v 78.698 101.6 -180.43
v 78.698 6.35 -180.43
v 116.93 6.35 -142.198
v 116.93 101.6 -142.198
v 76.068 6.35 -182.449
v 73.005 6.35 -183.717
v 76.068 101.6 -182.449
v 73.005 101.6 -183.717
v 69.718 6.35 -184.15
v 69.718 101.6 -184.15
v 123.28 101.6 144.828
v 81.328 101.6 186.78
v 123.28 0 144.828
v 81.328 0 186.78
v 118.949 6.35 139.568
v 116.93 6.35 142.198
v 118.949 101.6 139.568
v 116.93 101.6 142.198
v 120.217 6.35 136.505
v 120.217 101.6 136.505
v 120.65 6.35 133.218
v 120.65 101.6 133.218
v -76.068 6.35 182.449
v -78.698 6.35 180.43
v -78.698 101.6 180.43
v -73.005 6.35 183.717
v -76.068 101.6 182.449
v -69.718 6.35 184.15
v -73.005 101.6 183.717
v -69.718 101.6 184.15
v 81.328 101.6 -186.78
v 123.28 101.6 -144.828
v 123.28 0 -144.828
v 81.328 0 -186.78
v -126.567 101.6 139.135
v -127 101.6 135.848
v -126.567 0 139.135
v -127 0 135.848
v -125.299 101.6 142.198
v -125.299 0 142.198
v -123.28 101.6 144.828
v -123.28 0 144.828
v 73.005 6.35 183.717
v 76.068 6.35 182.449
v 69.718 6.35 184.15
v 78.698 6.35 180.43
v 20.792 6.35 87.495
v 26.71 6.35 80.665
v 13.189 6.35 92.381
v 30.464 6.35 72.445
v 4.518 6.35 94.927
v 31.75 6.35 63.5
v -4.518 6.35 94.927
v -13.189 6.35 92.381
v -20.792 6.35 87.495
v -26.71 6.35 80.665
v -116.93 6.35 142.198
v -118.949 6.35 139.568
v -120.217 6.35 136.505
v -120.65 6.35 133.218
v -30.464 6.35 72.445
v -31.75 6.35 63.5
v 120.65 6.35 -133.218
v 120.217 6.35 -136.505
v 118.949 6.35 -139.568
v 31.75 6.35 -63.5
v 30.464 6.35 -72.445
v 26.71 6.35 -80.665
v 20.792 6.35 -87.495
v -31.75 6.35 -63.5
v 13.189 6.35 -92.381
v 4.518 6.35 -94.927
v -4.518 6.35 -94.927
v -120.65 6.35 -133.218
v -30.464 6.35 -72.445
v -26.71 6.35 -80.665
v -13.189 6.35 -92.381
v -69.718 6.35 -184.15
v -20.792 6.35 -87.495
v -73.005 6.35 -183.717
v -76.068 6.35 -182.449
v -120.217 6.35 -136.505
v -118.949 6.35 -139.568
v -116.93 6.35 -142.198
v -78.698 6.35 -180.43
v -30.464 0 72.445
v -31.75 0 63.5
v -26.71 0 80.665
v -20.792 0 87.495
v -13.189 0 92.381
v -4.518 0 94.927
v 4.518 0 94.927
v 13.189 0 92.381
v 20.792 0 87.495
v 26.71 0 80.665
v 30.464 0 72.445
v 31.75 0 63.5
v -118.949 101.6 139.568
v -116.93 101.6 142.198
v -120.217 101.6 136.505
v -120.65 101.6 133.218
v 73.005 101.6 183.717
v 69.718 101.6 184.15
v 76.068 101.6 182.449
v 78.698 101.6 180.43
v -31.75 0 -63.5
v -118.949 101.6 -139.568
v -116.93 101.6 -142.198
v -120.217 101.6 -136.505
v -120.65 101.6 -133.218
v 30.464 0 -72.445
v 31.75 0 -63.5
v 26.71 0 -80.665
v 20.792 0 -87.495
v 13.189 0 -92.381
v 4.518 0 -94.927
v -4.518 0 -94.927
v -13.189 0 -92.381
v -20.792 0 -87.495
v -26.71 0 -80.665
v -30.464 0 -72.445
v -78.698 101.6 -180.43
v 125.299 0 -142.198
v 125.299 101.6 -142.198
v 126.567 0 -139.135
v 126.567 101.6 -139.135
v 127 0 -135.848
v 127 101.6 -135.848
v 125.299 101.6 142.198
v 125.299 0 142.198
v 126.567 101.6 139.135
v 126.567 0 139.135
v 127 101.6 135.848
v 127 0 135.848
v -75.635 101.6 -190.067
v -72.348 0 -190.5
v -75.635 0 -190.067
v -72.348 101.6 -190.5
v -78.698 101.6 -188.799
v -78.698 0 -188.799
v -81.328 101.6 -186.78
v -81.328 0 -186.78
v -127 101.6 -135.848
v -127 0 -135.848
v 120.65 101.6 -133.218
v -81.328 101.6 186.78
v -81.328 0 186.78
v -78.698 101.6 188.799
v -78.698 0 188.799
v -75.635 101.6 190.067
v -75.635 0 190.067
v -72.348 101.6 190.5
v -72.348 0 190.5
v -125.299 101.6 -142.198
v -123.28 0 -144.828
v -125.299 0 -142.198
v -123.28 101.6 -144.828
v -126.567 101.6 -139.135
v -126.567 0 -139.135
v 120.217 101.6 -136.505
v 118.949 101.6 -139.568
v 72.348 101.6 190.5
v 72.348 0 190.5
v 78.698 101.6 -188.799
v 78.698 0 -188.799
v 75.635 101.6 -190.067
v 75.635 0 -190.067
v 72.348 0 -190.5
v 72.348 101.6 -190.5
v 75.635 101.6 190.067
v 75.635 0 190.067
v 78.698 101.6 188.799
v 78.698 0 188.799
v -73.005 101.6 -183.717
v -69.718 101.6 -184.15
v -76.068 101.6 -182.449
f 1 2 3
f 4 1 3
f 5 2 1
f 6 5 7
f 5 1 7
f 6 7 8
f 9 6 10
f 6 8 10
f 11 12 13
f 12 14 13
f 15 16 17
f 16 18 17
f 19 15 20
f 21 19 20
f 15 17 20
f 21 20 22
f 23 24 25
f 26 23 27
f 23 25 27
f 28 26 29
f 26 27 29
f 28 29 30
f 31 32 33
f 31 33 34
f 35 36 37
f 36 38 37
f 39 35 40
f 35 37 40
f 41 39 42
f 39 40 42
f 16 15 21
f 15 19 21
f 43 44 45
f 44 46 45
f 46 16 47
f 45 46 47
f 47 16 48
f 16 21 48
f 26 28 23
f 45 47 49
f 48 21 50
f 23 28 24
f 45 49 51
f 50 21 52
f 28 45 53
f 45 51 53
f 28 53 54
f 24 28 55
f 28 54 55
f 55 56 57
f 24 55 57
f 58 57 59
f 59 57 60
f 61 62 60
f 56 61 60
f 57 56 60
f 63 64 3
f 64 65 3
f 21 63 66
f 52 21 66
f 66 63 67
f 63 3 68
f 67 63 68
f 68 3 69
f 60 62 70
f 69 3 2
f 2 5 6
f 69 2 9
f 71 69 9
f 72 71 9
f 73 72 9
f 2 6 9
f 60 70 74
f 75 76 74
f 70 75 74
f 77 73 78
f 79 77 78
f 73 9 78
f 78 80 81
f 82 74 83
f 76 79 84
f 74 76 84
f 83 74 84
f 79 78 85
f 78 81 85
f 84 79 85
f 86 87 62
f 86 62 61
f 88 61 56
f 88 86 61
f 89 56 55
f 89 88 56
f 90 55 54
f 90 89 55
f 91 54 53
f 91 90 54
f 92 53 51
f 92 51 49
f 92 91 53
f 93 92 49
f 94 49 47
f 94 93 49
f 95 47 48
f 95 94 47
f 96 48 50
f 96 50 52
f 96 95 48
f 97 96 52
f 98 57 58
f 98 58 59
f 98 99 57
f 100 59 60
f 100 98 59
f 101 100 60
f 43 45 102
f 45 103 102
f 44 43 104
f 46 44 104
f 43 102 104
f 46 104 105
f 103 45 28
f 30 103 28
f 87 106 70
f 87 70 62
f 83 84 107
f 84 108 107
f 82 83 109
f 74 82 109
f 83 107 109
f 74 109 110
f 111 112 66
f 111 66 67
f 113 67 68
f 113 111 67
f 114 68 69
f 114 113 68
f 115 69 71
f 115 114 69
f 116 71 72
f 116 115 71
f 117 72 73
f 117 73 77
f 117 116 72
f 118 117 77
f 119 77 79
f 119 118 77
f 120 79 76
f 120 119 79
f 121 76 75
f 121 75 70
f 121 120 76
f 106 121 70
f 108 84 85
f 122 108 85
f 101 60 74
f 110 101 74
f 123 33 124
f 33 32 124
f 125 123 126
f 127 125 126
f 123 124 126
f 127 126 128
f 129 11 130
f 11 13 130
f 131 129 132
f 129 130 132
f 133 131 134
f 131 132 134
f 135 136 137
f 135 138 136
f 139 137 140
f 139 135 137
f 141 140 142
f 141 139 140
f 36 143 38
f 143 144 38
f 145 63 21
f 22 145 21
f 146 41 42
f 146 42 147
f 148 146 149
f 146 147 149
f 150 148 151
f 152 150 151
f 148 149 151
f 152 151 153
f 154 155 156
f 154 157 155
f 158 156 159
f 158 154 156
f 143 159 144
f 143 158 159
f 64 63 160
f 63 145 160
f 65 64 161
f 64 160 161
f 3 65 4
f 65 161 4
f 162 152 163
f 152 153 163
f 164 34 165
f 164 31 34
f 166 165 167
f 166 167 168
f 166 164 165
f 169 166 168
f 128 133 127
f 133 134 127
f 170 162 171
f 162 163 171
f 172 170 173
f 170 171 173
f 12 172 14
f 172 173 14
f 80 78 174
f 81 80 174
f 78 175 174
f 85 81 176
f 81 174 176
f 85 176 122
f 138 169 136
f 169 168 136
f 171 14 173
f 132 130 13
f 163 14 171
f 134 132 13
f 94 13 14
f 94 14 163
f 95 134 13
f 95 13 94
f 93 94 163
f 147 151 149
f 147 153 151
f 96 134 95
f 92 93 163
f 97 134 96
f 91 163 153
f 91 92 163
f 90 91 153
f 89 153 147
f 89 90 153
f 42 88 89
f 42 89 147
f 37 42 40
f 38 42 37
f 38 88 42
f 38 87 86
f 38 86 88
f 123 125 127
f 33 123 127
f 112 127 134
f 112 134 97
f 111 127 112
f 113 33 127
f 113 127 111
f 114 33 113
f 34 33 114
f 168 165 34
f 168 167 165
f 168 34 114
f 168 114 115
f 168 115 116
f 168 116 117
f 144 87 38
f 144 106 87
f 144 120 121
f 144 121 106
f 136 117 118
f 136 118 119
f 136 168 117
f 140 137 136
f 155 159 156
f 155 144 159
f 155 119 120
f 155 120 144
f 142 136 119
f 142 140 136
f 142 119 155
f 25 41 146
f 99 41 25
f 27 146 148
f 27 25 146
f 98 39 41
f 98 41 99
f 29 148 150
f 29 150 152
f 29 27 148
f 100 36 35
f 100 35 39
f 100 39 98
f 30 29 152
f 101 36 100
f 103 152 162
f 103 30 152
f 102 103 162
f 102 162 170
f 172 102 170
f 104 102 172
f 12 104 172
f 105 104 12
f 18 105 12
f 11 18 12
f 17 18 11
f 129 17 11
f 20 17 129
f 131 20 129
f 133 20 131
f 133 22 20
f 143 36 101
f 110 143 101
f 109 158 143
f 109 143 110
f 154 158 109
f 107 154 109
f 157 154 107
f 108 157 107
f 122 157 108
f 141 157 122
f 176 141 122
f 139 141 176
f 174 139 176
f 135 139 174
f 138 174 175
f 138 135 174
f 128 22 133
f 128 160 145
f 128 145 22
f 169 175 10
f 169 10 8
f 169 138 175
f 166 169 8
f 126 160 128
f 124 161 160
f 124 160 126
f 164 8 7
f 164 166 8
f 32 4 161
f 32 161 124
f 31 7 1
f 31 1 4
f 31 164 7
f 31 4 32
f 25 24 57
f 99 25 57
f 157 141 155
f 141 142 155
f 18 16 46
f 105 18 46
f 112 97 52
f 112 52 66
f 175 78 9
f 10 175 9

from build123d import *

# Parameters (mm, degrees)
BOSS_EXTRUDE1_DEPTH = 6.35
BOSS_EXTRUDE2_DEPTH = 101.6
FILLET1_R           = 12.7
FILLET2_R           = 12.7


with BuildPart() as part:
    # Sketch1 → Boss-Extrude1 (new body)
    with BuildSketch(Plane(origin=(0, 0, 0), x_dir=(1, 0, 0), z_dir=(0, 1, 0))):
        Polygon((-77.608591334, 190.5), (-127, 141.108591334), (-127, -141.108591334), (-77.608591334, -190.5), (77.608591334, -190.5), (127, -141.108591334), (127, 141.108591334), (77.608591334, 190.5), align=None)
        with BuildLine():
            Line((-31.75, -63.5), (-31.75, 63.5))
            ThreePointArc((-31.75, 63.5), (0, 95.25), (31.75, 63.5))
            Line((31.75, 63.5), (31.75, -63.5))
            ThreePointArc((31.75, -63.5), (0, -95.25), (-31.75, -63.5))
        make_face(mode=Mode.SUBTRACT)
    extrude(amount=BOSS_EXTRUDE1_DEPTH)

    # Sketch1<4> → Boss-Extrude2 (add)
    with BuildSketch(Plane(origin=(0, 0, 0), x_dir=(1, 0, 0), z_dir=(0, 1, 0))):
        Polygon((-77.608591334, 190.5), (-127, 141.108591334), (-127, -141.108591334), (-77.608591334, -190.5), (77.608591334, -190.5), (127, -141.108591334), (127, 141.108591334), (77.608591334, 190.5), align=None)
        Polygon((-120.65, 138.478335213), (-74.978335213, 184.15), (74.978335213, 184.15), (120.65, 138.478335213), (120.65, -138.478335213), (74.978335213, -184.15), (-74.978335213, -184.15), (-120.65, -138.478335213), align=None, mode=Mode.SUBTRACT)
    extrude(amount=BOSS_EXTRUDE2_DEPTH)

    # Fillet1
    fillet1_edges = [part.edges().sort_by_distance(p)[0] for p in [
        (77.608591334, 50.8, 190.5),
        (127, 50.8, 141.108591334),
        (-77.608591334, 50.8, 190.5),
        (-127, 50.8, 141.108591334),
        (-127, 50.8, -141.108591334),
        (-77.608591334, 50.8, -190.5),
        (127, 50.8, -141.108591334),
        (77.608591334, 50.8, -190.5),
    ]]
    fillet(fillet1_edges, radius=FILLET1_R)

    # Fillet2
    fillet2_edges = [part.edges().sort_by_distance(p)[0] for p in [
        (74.978335213, 53.975, 184.15),
        (120.65, 53.975, 138.478335213),
        (-74.978335213, 53.975, 184.15),
        (-120.65, 53.975, 138.478335213),
        (-120.65, 53.975, -138.478335213),
        (120.65, 53.975, -138.478335213),
        (74.978335213, 53.975, -184.15),
        (-74.978335213, 53.975, -184.15),
    ]]
    fillet(fillet2_edges, radius=FILLET2_R)


solid = part.part
